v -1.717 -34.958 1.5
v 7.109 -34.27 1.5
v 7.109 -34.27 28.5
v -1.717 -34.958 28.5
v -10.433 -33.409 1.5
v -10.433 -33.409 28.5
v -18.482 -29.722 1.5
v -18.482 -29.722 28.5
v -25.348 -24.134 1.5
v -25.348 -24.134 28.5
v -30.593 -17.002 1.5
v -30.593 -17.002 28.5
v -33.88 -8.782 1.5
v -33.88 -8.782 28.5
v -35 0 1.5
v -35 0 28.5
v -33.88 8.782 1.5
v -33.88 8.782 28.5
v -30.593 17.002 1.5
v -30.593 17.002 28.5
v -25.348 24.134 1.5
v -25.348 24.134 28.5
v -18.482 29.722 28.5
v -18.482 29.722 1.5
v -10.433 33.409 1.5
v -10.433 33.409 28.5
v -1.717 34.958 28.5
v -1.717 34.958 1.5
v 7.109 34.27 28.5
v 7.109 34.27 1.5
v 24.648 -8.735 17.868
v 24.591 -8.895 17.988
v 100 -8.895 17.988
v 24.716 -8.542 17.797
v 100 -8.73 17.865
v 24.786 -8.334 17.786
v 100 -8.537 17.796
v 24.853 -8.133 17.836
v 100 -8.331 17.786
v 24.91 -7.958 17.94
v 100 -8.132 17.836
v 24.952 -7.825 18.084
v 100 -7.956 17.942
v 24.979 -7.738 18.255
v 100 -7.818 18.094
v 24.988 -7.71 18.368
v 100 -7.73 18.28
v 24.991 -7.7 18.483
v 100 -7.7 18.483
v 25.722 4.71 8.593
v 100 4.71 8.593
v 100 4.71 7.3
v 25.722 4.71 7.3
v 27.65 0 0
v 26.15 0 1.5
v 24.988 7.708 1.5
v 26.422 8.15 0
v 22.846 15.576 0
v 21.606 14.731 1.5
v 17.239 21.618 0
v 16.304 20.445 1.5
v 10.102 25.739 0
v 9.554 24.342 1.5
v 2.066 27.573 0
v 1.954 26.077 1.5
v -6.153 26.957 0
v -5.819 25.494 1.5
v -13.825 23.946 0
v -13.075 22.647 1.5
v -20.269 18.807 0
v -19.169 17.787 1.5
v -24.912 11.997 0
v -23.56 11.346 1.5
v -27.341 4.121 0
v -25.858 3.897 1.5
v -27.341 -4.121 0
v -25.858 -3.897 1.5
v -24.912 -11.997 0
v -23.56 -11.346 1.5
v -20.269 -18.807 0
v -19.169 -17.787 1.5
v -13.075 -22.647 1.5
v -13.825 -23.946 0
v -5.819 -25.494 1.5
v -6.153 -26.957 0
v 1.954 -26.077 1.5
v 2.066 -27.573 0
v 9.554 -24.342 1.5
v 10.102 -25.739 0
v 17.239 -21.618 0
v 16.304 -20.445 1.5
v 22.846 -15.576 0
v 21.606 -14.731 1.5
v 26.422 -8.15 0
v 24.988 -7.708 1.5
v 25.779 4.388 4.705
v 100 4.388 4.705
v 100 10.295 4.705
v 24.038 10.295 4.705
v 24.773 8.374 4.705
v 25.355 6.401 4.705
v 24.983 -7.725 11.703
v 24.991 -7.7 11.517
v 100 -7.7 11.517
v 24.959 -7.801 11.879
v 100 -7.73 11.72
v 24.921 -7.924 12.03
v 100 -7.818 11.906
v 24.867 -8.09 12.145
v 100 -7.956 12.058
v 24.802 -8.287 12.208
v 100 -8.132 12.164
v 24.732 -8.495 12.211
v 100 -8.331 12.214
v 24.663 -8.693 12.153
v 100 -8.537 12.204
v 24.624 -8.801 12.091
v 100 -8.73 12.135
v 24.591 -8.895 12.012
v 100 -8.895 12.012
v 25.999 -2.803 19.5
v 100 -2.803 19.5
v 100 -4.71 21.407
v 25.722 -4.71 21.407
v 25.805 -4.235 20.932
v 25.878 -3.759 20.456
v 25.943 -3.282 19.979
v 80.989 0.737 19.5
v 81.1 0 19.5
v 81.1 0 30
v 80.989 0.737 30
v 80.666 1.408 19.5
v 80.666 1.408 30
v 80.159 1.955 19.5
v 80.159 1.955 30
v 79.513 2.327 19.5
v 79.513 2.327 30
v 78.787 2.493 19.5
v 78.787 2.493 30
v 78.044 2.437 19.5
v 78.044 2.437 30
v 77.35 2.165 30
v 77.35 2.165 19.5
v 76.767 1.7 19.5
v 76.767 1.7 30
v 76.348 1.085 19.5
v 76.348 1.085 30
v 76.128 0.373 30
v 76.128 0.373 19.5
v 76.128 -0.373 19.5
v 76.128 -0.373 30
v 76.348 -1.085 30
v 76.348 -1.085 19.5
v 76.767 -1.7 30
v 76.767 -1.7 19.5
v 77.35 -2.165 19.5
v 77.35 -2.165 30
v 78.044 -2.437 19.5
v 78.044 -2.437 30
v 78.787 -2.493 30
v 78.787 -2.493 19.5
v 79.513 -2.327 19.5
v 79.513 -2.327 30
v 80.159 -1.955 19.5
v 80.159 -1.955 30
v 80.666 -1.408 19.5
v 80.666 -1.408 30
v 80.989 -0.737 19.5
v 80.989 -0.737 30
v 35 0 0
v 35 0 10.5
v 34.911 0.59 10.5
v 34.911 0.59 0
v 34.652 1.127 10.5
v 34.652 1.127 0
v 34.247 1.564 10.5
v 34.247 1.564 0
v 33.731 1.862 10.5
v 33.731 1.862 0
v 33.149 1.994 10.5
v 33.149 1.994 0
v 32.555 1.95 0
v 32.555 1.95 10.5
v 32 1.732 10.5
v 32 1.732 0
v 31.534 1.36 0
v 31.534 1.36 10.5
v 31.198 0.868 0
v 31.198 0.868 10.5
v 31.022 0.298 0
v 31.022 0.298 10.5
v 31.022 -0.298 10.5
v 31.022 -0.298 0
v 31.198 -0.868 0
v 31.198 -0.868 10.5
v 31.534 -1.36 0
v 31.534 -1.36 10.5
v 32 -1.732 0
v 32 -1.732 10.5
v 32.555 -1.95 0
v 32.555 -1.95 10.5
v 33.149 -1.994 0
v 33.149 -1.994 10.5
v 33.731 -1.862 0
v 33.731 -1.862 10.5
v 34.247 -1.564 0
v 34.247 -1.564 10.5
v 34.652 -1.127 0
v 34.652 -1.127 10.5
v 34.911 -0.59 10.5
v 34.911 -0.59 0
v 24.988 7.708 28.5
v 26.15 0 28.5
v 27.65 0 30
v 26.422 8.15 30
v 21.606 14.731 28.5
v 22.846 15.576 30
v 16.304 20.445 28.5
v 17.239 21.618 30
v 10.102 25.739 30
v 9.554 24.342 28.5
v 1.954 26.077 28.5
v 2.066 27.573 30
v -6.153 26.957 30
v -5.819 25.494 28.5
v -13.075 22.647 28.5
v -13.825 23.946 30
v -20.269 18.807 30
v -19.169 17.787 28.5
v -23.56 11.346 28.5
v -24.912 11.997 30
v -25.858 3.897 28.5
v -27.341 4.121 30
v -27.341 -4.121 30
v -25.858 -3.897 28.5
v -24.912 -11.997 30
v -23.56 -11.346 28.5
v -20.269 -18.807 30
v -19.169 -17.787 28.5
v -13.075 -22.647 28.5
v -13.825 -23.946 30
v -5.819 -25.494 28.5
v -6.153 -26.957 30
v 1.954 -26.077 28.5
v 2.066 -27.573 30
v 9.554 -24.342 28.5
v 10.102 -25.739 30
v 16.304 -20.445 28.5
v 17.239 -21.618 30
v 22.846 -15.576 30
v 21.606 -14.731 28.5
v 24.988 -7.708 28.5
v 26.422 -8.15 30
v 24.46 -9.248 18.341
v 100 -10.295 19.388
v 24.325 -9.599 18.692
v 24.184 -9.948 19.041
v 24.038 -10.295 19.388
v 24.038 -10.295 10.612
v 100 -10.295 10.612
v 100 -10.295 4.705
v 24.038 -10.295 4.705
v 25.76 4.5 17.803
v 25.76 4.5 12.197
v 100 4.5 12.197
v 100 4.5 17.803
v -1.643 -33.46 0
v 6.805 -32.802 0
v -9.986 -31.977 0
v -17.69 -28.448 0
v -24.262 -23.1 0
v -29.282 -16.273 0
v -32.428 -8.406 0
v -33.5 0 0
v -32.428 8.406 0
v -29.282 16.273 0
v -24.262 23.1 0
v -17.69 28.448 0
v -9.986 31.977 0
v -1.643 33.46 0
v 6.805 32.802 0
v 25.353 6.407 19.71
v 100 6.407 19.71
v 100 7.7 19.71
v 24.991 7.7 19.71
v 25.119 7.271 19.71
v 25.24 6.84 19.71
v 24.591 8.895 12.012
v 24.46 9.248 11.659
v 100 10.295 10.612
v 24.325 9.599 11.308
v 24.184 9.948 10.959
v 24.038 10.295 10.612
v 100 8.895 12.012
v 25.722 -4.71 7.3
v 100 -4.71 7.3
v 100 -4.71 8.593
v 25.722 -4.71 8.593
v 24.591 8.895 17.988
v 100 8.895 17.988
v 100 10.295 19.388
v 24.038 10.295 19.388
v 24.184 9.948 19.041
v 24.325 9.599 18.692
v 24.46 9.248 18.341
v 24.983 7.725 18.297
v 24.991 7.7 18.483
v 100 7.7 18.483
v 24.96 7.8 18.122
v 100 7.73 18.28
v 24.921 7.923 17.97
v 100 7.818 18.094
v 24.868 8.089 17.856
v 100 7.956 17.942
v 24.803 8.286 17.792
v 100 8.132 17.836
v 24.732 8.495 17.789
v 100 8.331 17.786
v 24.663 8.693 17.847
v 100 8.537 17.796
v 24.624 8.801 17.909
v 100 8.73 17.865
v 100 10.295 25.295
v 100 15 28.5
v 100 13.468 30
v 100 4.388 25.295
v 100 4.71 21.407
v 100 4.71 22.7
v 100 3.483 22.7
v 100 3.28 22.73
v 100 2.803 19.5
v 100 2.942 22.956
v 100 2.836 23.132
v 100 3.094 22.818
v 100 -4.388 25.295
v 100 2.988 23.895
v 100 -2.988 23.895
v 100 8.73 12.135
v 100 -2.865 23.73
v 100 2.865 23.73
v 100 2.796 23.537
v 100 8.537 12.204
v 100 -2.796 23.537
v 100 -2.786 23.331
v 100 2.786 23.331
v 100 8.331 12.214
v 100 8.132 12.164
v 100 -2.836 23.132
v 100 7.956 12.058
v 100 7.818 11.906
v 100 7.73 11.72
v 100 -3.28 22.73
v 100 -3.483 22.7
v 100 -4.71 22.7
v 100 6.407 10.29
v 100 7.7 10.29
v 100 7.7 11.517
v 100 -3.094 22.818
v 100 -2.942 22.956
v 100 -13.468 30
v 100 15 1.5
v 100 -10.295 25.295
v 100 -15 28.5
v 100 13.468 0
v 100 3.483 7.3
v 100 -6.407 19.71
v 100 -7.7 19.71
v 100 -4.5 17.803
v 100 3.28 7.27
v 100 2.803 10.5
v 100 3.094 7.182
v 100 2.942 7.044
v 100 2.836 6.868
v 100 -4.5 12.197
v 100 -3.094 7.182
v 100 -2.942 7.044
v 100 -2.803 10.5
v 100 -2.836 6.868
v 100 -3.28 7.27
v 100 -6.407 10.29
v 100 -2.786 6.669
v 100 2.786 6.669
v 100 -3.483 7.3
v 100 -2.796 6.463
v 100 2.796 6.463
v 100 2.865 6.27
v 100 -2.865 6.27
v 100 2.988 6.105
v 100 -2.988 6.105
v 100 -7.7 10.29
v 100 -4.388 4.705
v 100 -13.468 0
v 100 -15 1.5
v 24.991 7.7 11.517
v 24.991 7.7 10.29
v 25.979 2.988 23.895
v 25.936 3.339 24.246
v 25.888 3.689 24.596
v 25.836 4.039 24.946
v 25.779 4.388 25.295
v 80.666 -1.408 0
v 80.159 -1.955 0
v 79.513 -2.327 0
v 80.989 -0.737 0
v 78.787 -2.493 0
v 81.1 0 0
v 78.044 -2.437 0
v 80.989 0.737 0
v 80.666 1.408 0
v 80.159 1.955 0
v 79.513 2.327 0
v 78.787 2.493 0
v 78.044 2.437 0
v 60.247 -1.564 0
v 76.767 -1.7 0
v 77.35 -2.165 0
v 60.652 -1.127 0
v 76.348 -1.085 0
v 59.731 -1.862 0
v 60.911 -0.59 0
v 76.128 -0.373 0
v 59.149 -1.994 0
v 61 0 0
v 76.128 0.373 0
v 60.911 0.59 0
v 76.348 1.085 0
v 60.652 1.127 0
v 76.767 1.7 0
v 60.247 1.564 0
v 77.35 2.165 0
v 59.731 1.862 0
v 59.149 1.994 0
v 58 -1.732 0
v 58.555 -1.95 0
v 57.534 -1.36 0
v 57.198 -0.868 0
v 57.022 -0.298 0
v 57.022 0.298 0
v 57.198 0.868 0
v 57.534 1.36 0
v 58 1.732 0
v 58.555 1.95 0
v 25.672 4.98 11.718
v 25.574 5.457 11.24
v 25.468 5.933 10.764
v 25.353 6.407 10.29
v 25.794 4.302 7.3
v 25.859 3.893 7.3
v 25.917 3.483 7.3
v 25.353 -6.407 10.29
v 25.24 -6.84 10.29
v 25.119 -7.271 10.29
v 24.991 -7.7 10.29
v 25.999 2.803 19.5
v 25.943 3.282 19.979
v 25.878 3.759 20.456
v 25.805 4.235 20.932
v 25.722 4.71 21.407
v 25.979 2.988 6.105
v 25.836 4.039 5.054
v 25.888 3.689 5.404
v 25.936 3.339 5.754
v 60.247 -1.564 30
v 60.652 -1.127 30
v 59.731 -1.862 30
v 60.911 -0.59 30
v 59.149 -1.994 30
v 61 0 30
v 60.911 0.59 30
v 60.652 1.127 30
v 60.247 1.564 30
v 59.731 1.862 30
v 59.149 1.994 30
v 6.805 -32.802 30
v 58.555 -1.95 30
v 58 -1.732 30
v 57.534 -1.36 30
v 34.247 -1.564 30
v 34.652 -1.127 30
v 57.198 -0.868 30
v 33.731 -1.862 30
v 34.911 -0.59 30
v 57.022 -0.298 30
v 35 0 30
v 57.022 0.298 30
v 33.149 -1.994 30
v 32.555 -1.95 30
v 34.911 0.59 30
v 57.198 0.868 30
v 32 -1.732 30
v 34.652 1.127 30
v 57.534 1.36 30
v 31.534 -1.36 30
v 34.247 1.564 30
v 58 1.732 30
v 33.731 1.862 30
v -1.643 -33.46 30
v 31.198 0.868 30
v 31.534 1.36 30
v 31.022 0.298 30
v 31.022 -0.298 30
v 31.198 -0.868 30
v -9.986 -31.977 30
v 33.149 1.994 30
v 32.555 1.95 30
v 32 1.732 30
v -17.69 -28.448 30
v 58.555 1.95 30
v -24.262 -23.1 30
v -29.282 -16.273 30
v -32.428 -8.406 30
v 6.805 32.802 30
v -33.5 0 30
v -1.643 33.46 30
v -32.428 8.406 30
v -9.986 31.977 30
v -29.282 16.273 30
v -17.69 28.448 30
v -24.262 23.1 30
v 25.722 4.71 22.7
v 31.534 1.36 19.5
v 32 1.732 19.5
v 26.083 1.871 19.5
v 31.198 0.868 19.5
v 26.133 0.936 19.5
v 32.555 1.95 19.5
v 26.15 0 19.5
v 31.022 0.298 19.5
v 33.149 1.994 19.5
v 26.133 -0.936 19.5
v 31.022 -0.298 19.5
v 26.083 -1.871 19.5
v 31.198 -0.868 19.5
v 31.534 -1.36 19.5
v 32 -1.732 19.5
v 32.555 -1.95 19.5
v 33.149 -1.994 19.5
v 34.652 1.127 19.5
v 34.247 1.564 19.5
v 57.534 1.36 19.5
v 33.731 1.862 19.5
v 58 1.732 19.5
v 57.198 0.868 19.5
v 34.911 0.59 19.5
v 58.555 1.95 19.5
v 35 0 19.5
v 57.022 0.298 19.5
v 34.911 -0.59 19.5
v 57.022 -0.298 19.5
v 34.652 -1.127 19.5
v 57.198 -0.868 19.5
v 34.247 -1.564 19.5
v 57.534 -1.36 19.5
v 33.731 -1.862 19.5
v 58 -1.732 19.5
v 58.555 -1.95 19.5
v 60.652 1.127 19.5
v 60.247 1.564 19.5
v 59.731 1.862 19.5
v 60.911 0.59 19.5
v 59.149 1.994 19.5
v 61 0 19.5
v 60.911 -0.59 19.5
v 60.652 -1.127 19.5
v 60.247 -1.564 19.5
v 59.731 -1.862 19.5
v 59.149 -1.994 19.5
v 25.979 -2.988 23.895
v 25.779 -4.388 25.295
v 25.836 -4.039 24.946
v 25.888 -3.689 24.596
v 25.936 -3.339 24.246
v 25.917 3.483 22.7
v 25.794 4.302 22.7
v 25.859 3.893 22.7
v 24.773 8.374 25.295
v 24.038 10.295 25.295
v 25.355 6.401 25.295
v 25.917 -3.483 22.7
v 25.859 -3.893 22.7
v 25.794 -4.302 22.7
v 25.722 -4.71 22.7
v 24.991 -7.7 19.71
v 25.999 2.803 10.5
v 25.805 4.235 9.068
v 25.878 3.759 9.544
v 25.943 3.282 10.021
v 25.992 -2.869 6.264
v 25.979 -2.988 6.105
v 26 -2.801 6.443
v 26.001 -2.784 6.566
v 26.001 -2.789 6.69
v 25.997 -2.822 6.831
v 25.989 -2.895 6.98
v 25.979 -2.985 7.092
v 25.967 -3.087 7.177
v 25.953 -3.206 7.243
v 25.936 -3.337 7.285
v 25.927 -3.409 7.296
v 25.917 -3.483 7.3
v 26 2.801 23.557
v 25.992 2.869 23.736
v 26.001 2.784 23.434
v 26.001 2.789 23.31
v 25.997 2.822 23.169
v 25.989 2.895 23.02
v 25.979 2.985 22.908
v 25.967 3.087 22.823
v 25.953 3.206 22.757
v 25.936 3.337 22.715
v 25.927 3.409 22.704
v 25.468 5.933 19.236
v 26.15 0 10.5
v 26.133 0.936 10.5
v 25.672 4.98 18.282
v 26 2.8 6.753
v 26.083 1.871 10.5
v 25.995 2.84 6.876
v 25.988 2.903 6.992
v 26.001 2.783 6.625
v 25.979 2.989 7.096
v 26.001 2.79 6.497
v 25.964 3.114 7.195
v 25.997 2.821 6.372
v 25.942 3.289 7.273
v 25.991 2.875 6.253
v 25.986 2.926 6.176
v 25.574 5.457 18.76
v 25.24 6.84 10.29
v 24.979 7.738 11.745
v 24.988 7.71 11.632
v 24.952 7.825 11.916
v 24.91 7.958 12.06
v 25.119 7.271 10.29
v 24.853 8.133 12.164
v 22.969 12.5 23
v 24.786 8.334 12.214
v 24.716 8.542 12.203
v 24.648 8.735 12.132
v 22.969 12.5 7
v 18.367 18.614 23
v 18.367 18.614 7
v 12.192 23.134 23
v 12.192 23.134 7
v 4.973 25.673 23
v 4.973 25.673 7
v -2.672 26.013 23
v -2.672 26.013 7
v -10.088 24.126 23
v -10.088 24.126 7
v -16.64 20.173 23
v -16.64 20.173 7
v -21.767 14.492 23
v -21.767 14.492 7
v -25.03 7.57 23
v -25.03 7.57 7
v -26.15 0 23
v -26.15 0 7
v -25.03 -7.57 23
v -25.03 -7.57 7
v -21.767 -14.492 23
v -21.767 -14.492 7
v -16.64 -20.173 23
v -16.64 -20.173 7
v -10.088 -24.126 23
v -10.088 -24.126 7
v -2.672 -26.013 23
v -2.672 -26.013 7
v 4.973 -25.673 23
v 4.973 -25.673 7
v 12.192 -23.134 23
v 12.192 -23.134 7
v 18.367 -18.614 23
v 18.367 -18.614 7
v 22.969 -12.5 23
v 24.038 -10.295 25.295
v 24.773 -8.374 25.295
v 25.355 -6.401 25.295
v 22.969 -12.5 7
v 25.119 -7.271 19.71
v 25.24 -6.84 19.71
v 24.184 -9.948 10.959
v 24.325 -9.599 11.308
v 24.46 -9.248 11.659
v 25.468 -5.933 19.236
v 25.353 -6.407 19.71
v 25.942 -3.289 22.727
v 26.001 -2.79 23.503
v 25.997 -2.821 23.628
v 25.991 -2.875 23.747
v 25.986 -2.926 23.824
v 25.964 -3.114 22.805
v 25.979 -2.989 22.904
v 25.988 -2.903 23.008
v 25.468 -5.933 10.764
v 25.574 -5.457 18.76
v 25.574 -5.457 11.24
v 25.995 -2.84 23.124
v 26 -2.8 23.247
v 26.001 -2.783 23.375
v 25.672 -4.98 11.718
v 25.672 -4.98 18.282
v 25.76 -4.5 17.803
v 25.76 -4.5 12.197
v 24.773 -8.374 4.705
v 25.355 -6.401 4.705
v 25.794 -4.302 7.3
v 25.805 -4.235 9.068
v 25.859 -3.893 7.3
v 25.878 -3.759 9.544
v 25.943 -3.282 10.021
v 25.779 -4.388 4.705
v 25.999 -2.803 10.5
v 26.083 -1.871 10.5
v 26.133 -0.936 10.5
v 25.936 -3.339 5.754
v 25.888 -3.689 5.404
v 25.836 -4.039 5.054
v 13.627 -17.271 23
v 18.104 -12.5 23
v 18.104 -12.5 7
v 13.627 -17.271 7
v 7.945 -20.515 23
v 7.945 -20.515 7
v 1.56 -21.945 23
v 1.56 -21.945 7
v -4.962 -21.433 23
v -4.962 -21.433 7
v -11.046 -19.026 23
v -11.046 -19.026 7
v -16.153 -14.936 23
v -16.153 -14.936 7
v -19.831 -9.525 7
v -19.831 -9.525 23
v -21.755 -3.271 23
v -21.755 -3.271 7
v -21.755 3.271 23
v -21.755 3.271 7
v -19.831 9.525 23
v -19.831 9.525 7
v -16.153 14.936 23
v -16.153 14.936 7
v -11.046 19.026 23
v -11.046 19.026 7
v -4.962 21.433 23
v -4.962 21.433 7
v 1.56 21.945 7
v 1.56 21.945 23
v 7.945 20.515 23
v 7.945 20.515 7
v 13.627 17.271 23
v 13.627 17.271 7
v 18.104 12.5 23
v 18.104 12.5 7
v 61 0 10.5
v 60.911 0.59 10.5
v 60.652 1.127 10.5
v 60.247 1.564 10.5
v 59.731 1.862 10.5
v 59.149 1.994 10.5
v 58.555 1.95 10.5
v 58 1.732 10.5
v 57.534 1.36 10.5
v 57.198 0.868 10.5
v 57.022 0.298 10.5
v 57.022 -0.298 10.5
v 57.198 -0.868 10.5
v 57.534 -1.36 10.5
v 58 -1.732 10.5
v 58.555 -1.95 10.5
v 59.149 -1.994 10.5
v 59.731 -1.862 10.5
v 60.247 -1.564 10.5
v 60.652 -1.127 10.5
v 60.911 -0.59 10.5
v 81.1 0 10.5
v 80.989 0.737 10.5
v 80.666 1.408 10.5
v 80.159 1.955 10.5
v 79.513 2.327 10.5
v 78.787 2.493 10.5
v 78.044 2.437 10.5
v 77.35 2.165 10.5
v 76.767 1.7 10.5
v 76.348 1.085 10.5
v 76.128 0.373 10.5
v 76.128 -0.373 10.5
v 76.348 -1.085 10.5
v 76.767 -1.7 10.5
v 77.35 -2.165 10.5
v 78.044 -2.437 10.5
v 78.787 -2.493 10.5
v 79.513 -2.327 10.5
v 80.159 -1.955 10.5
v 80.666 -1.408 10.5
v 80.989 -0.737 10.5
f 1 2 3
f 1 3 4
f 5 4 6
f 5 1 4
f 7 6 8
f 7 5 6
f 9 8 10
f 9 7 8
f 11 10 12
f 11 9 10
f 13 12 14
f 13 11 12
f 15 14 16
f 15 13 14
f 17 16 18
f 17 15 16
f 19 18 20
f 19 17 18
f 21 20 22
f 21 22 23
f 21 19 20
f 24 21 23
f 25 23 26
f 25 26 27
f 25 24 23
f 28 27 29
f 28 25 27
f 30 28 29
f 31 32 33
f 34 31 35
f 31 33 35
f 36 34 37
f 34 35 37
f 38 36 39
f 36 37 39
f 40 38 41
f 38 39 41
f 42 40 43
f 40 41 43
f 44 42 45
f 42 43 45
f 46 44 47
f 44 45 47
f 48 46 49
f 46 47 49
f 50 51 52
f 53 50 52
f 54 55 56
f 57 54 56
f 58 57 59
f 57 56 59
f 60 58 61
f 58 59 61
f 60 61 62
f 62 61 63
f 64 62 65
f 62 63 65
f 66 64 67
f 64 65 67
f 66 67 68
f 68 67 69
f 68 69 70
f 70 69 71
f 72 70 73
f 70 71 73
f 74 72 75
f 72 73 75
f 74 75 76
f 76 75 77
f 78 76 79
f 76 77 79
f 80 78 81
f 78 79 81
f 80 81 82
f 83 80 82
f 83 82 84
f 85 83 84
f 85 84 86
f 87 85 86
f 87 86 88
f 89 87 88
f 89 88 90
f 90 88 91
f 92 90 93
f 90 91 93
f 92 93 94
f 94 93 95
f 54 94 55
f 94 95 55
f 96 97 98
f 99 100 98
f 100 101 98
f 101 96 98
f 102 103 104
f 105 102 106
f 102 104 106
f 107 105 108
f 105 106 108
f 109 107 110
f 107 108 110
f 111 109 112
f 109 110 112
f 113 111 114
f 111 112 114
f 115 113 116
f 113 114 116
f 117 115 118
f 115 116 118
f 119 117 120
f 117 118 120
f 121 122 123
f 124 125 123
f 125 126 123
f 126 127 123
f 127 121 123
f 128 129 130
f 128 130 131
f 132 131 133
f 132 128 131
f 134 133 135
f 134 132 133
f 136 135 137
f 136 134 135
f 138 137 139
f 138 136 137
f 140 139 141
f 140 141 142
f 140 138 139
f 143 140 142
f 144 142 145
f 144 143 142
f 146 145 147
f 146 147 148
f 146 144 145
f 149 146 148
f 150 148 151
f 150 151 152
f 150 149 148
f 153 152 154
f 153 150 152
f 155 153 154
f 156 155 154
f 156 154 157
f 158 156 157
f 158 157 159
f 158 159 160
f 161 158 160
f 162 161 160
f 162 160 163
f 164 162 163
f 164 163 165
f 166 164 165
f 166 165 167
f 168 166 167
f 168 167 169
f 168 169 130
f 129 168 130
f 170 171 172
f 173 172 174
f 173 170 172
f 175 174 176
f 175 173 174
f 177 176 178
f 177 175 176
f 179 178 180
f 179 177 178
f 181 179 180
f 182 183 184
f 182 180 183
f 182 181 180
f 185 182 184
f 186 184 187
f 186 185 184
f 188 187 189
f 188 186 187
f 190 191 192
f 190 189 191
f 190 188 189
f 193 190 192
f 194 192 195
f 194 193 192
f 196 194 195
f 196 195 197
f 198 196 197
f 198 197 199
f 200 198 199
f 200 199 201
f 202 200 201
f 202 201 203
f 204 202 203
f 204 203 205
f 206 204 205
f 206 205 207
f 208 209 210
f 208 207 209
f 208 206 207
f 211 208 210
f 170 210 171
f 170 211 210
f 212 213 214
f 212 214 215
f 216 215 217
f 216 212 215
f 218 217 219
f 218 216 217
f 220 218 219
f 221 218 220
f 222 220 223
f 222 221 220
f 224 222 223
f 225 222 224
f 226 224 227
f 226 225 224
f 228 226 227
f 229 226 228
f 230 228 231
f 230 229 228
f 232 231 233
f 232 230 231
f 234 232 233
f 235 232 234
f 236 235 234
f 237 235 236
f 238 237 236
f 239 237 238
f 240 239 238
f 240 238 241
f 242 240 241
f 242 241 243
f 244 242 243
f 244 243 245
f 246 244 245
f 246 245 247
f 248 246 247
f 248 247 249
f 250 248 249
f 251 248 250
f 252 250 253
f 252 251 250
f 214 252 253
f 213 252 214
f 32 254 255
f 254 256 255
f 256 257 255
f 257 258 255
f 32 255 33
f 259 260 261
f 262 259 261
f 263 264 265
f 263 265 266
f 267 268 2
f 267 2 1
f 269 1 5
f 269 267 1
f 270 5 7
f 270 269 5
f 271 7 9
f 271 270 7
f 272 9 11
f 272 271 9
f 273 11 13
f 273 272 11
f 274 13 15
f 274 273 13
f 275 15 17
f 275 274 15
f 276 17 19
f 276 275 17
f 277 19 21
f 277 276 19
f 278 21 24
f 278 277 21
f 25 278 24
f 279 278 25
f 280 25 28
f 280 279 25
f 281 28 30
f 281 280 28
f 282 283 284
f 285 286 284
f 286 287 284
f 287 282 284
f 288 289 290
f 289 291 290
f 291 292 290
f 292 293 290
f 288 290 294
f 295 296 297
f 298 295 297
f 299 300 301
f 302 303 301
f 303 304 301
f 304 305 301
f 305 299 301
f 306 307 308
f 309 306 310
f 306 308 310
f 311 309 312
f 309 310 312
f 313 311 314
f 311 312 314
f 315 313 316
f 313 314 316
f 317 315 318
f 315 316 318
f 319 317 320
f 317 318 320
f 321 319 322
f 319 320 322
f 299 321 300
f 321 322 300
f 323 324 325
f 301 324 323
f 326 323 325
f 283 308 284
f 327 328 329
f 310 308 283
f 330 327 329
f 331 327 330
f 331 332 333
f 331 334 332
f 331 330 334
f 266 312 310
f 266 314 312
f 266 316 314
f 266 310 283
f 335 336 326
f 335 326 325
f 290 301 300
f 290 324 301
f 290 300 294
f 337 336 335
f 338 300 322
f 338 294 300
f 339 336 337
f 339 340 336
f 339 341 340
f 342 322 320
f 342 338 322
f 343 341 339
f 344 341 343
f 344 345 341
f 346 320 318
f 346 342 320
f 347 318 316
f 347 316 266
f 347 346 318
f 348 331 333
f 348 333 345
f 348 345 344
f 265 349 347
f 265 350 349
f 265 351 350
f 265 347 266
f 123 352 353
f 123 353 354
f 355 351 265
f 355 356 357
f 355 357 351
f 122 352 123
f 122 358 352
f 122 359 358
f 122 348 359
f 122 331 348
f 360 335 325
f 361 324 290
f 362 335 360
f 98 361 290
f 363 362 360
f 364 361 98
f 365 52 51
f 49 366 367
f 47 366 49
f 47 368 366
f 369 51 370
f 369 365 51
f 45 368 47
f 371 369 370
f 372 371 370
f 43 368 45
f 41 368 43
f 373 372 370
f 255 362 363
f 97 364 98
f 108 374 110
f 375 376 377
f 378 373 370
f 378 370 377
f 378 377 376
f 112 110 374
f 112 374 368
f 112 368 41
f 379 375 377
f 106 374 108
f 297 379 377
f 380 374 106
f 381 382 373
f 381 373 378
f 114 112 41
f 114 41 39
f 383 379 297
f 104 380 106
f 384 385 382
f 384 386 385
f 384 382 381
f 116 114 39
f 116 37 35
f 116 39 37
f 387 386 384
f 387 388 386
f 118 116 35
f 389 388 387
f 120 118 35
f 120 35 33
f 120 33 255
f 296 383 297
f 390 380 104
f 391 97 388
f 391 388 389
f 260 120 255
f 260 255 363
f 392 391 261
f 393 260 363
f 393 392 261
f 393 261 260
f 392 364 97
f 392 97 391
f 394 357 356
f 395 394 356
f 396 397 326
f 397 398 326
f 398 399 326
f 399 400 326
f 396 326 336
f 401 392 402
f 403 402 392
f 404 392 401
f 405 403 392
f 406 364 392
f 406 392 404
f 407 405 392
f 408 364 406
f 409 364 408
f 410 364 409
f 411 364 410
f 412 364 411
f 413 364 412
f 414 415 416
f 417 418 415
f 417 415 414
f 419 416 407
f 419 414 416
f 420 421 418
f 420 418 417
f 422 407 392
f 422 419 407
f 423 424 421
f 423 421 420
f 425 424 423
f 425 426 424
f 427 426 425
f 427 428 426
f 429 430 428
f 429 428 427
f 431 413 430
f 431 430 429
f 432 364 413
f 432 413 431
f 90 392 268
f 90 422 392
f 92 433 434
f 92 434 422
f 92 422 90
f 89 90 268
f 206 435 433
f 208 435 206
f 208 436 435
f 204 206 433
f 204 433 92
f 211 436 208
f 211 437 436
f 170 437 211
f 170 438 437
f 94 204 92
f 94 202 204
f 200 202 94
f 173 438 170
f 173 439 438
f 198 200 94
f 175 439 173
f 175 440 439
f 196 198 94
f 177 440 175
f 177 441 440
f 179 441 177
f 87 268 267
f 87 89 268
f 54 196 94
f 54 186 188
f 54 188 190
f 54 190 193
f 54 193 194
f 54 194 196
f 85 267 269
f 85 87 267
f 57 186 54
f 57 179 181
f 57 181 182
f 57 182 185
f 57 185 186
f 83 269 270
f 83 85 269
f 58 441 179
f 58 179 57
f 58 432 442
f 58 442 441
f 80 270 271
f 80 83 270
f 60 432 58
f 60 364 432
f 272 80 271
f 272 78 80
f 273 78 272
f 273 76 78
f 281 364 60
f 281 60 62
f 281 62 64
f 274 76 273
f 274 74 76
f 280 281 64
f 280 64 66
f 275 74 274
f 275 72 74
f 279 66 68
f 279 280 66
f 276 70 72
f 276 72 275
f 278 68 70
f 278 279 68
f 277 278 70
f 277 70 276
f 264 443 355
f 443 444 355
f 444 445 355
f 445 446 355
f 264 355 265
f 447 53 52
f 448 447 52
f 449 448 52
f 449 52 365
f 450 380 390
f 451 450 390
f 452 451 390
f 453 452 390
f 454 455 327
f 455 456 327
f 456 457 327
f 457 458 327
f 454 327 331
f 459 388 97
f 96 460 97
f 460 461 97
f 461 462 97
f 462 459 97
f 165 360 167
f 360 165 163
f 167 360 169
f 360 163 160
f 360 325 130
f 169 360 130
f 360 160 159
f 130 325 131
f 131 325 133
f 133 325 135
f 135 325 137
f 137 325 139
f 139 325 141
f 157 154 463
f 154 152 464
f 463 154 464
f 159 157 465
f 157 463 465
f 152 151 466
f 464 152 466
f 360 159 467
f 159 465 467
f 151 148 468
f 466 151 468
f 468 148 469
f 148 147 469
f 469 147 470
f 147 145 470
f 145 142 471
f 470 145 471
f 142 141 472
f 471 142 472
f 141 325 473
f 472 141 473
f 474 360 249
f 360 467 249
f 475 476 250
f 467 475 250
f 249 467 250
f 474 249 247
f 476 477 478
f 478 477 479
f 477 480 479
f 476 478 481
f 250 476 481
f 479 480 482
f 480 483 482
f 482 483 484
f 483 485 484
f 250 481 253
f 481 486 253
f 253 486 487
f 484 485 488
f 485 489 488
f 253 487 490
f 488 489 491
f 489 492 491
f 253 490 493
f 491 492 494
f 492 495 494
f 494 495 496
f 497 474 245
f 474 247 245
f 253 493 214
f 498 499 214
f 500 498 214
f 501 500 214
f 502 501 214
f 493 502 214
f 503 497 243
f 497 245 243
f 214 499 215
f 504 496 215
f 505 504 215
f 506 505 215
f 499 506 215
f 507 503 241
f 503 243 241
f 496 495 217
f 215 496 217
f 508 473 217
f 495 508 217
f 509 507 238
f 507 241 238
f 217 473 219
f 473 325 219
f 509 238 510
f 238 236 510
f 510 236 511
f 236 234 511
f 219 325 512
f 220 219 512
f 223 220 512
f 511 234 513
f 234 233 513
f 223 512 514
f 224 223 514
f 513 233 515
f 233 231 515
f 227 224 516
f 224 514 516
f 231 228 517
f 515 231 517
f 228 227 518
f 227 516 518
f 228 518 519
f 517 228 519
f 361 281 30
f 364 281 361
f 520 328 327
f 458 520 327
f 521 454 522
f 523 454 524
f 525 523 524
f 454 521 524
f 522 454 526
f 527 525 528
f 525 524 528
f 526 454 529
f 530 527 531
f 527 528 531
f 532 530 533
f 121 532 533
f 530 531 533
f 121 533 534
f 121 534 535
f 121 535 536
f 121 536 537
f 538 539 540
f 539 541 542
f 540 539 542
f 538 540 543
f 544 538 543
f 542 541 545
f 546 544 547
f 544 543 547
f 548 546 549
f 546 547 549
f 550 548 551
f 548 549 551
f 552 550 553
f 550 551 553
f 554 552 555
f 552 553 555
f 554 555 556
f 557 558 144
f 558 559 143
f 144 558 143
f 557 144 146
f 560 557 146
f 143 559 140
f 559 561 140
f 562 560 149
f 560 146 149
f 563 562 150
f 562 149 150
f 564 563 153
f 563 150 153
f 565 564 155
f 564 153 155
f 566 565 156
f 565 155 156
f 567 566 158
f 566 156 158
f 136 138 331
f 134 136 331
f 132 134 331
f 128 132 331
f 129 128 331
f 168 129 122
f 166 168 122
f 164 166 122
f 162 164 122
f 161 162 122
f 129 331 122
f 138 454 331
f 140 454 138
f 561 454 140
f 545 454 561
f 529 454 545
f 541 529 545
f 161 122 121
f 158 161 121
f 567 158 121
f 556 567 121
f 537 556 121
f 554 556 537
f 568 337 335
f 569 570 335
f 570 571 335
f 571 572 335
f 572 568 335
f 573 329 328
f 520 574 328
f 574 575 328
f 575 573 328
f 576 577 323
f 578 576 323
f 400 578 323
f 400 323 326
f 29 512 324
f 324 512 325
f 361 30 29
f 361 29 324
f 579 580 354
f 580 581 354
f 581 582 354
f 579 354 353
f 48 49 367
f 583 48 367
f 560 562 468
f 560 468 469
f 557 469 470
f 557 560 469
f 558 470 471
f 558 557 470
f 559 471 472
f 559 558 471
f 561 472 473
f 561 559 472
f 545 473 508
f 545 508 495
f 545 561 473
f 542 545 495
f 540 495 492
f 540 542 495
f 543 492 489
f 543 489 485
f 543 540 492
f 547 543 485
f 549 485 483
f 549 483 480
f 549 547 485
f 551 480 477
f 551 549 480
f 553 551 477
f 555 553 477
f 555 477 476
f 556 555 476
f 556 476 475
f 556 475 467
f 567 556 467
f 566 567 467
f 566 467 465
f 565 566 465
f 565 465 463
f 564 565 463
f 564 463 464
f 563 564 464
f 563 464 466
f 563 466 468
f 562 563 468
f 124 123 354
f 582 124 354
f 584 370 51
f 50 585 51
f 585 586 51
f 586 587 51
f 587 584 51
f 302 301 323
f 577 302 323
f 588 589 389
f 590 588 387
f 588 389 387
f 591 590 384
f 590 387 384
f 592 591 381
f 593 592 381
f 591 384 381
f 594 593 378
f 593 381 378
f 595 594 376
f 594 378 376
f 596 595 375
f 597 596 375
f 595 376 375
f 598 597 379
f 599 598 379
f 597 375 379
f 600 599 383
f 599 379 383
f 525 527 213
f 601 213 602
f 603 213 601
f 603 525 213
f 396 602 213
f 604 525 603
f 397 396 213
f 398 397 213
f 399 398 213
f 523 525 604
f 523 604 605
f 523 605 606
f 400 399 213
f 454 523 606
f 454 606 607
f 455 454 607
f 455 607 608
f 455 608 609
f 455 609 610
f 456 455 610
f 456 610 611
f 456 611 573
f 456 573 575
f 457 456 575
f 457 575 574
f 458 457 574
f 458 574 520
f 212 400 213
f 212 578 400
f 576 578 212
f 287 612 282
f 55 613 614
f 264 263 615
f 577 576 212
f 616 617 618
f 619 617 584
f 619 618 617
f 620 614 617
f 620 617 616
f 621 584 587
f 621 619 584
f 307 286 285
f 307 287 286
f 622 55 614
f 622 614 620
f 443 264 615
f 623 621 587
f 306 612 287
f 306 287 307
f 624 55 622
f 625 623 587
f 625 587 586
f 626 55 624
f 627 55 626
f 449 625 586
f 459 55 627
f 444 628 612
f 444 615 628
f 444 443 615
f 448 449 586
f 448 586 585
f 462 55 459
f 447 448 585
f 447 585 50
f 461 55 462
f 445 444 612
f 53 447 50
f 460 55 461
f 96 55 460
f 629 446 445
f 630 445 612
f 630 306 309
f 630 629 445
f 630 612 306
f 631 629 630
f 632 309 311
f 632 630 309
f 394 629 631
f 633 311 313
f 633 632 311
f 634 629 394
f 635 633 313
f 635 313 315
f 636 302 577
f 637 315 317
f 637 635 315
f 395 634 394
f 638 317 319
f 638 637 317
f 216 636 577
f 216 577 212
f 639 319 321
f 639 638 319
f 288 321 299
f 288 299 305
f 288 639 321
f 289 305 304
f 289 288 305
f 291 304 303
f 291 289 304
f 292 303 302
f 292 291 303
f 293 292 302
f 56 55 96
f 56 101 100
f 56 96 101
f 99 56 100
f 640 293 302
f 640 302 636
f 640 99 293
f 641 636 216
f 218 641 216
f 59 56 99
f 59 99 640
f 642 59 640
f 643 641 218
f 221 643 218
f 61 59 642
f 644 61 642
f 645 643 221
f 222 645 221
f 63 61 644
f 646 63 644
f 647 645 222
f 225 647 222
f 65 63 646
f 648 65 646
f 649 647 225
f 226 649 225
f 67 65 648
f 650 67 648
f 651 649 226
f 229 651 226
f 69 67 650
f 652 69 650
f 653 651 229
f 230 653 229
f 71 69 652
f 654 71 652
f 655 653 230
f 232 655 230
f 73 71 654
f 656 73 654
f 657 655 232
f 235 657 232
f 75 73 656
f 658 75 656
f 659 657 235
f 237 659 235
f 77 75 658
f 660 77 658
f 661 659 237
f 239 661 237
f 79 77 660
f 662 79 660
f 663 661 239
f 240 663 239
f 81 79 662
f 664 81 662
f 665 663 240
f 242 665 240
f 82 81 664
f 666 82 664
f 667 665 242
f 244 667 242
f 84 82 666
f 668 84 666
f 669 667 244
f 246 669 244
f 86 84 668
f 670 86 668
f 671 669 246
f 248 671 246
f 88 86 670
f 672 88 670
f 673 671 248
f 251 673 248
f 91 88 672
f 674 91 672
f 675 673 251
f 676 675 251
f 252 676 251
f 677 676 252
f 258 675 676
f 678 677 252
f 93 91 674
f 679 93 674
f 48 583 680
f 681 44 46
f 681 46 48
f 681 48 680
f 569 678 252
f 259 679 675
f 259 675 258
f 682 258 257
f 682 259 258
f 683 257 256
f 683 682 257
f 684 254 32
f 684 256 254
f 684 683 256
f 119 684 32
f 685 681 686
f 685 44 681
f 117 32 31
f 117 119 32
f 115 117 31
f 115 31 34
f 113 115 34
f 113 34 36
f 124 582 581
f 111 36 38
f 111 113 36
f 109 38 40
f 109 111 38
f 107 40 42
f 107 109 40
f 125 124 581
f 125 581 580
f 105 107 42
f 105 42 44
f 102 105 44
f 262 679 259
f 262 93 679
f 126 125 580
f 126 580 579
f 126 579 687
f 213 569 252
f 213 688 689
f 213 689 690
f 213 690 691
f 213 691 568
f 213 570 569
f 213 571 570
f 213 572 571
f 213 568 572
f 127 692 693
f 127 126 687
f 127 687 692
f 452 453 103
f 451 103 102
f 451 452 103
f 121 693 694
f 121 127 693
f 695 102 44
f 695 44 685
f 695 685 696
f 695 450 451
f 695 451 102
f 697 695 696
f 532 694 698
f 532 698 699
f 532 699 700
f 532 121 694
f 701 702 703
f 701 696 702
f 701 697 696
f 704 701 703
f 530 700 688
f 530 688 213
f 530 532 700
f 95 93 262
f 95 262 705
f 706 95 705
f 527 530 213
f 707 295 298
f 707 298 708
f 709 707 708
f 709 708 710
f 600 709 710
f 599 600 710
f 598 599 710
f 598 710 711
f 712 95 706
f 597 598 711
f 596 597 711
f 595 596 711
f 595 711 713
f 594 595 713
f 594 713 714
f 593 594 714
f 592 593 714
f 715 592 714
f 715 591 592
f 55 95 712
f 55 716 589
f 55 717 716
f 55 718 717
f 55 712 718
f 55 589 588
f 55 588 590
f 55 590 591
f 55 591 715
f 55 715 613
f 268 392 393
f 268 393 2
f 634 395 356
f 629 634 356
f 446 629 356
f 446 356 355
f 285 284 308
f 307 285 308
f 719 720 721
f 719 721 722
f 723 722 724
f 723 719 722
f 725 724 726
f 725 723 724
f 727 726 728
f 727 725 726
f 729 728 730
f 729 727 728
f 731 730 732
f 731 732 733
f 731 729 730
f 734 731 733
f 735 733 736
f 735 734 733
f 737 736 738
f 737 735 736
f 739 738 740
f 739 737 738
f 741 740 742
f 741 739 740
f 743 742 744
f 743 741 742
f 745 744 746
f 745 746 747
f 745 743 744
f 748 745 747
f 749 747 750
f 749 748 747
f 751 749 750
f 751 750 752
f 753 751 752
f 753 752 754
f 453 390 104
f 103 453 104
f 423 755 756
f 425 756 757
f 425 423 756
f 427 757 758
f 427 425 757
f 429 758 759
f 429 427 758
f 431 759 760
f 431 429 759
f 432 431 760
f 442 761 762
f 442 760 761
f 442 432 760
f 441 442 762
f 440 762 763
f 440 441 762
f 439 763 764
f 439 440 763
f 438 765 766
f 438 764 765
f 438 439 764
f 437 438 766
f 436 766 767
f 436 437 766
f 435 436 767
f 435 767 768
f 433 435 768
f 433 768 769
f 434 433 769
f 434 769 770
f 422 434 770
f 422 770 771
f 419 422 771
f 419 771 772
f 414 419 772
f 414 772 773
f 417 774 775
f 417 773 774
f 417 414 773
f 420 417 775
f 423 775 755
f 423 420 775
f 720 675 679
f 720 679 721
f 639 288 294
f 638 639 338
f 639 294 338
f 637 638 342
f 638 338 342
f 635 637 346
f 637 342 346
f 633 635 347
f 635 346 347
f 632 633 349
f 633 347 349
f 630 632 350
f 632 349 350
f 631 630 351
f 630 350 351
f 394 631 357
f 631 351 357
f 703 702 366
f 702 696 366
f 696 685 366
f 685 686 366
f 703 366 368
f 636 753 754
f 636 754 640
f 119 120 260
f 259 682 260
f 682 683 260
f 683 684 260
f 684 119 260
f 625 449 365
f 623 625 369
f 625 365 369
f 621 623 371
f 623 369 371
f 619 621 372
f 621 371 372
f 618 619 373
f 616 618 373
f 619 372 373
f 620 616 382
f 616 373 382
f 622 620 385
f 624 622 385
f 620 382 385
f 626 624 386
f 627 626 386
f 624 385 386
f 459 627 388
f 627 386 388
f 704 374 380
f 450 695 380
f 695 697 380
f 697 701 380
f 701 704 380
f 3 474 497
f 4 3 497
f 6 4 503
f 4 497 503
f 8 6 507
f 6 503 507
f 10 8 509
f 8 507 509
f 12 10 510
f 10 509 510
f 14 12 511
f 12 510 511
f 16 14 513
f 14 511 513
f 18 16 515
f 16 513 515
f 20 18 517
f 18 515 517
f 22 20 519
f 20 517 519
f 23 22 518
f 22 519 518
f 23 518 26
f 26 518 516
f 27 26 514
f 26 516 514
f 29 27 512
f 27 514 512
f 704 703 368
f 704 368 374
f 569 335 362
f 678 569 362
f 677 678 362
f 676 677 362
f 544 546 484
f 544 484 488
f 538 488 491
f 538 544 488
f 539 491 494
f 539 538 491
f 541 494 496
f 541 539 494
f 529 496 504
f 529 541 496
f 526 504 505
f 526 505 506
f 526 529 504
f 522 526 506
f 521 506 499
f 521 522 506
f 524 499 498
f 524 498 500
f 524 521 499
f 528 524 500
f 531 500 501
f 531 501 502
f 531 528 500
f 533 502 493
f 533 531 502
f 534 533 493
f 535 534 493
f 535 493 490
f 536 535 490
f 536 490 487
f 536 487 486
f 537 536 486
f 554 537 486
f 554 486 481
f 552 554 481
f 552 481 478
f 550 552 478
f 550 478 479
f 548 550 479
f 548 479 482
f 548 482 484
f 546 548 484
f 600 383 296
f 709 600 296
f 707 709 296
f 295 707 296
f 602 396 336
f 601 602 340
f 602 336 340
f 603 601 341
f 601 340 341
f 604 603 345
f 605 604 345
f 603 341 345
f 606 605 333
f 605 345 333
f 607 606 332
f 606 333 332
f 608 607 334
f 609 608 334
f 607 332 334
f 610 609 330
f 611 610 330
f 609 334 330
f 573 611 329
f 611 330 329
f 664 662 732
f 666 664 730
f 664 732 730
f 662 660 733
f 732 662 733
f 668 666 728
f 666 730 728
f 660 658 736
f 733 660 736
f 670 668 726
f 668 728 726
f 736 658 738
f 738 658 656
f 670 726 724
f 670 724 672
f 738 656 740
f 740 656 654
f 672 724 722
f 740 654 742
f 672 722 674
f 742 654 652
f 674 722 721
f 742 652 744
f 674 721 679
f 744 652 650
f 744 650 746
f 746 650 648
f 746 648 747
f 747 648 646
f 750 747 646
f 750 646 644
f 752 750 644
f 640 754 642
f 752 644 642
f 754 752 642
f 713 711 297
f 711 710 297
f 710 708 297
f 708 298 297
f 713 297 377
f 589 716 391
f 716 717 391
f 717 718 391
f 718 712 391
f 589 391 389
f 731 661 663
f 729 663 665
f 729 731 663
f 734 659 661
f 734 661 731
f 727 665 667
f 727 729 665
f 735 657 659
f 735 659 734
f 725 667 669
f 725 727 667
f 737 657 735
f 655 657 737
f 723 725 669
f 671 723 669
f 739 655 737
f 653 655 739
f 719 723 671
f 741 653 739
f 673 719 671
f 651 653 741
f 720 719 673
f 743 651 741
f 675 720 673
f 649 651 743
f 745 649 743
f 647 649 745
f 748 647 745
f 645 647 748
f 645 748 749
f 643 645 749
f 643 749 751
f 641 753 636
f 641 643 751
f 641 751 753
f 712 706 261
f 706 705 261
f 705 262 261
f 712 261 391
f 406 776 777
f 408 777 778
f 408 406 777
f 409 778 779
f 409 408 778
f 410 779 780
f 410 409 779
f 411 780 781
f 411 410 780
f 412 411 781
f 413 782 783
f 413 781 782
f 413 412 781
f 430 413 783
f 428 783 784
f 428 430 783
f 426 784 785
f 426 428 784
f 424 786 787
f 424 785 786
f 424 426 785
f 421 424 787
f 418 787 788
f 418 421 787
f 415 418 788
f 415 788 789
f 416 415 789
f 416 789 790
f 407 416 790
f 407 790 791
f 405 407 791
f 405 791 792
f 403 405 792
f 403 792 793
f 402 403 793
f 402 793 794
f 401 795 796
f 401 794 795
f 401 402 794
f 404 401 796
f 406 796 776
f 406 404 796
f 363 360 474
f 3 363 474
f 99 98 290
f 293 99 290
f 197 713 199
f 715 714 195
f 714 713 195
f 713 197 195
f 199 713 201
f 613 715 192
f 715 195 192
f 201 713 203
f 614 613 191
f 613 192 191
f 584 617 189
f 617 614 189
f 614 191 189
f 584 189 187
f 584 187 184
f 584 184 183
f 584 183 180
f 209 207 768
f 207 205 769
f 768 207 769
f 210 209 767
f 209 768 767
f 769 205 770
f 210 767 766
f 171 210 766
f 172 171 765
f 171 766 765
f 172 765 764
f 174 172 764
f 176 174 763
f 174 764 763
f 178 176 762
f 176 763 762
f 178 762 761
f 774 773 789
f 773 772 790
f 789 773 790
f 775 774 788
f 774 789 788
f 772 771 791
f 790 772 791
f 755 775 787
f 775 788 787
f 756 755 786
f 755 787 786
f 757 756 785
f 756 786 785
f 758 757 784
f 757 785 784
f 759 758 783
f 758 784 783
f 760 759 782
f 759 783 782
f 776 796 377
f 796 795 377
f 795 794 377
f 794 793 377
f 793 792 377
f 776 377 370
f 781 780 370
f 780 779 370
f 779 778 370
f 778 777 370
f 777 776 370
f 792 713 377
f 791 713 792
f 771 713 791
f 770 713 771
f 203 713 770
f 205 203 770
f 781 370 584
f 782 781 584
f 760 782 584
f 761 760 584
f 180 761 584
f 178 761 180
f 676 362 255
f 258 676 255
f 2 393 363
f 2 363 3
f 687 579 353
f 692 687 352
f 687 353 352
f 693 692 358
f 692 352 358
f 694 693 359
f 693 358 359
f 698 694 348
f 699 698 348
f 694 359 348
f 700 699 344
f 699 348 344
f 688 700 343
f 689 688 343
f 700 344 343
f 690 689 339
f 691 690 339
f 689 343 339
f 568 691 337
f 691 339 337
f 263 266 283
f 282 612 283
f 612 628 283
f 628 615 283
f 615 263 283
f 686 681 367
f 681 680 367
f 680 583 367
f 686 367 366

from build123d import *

# Parameters (mm, degrees)
SKETCH1_R           = 26.15
SKETCH1_R_2         = 2
SKETCH1_R_3         = 2.5
BOSS_EXTRUDE1_DEPTH = 30
BOSS_EXTRUDE2_START = -7
BOSS_EXTRUDE2_DEPTH = 16
CHAMFER1_SIZE       = 1.5
CUT_EXTRUDE1_DEPTH  = 90


with BuildPart() as part:
    # Sketch1 → Boss-Extrude1 (new body)
    with BuildSketch(Plane.XY):
        with BuildLine():
            Line((100, 15), (100, -15))
            Line((100, -15), (7.109450059, -34.270332941))
            ThreePointArc((7.109450059, -34.270332941), (-35, 0), (7.109450059, 34.270332941))
            Line((7.109450059, 34.270332941), (100, 15))
        make_face()
        Circle(SKETCH1_R, mode=Mode.SUBTRACT)
        with Locations((59, 0)):
            Circle(SKETCH1_R_2, mode=Mode.SUBTRACT)
        with Locations((78.6, 0)):
            Circle(SKETCH1_R_3, mode=Mode.SUBTRACT)
        with Locations((33, 0)):
            Circle(SKETCH1_R_2, mode=Mode.SUBTRACT)
    extrude(amount=BOSS_EXTRUDE1_DEPTH)

    # Sketch2 → Boss-Extrude2 (add)
    with BuildSketch(Plane.XY.offset(30).offset(BOSS_EXTRUDE2_START)):
        with BuildLine():
            Line((18.10386699, 12.5), (22.968946428, 12.5))
            ThreePointArc((22.968946428, 12.5), (-26.15, 0), (22.968946428, -12.5))
            Line((22.968946428, -12.5), (18.10386699, -12.5))
            ThreePointArc((18.10386699, -12.5), (-22, 0), (18.10386699, 12.5))
        make_face()
    extrude(amount=-BOSS_EXTRUDE2_DEPTH)

    # Chamfer1
    chamfer1_edges = [part.edges().sort_by_distance(p)[0] for p in [
        (-26.15, 0, 0),
        (-26.15, 0, 30),
        (53.554725029, -24.63516647, 30),
        (53.554725029, 24.63516647, 30),
        (53.554725029, -24.63516647, 0),
        (-35, 0, 0),
        (53.554725029, 24.63516647, 0),
        (-35, 0, 30),
    ]]
    chamfer(chamfer1_edges, length=CHAMFER1_SIZE)

    # Sketch3 → Cut-Extrude1 (cut)
    with BuildSketch(Plane(origin=(100, 0, 0), x_dir=(0, 0, -1), z_dir=(1, 0, 0))):
        with BuildLine():
            Line((-12.197056275, 4.5), (-17.802943725, 4.5))
            Line((-17.802943725, 4.5), (-19.710050506, 6.407106781))
            Line((-19.710050506, 6.407106781), (-19.710050506, 7.7))
            Line((-19.710050506, 7.7), (-18.482842712, 7.7))
            ThreePointArc((-18.482842712, 7.7), (-17.83612704, 8.132121597), (-17.987867966, 8.894974747))
            Line((-17.987867966, 8.894974747), (-19.387867966, 10.294974747))
            Line((-19.387867966, 10.294974747), (-25.294974747, 10.294974747))
            Line((-25.294974747, 10.294974747), (-25.294974747, 4.387867966))
            Line((-25.294974747, 4.387867966), (-23.894974747, 2.987867966))
            ThreePointArc((-23.894974747, 2.987867966), (-23.132121597, 2.83612704), (-22.7, 3.482842712))
            Line((-22.7, 3.482842712), (-22.7, 4.710050506))
            Line((-22.7, 4.710050506), (-21.407106781, 4.710050506))
            Line((-21.407106781, 4.710050506), (-19.5, 2.802943725))
            Line((-19.5, 2.802943725), (-19.5, -2.802943725))
            Line((-19.5, -2.802943725), (-21.407106781, -4.710050506))
            Line((-21.407106781, -4.710050506), (-22.7, -4.710050506))
            Line((-22.7, -4.710050506), (-22.7, -3.482842712))
            ThreePointArc((-22.7, -3.482842712), (-23.132121597, -2.83612704), (-23.894974747, -2.987867966))
            Line((-23.894974747, -2.987867966), (-25.294974747, -4.387867966))
            Line((-25.294974747, -4.387867966), (-25.294974747, -10.294974747))
            Line((-25.294974747, -10.294974747), (-19.387867966, -10.294974747))
            Line((-19.387867966, -10.294974747), (-17.987867966, -8.894974747))
            ThreePointArc((-17.987867966, -8.894974747), (-17.83612704, -8.132121597), (-18.482842712, -7.7))
            Line((-18.482842712, -7.7), (-19.710050506, -7.7))
            Line((-19.710050506, -7.7), (-19.710050506, -6.407106781))
            Line((-19.710050506, -6.407106781), (-17.802943725, -4.5))
            Line((-17.802943725, -4.5), (-12.197056275, -4.5))
            Line((-12.197056275, -4.5), (-10.289949494, -6.407106781))
            Line((-10.289949494, -6.407106781), (-10.289949494, -7.7))
            Line((-10.289949494, -7.7), (-11.517157288, -7.7))
            ThreePointArc((-11.517157288, -7.7), (-12.16387296, -8.132121597), (-12.012132034, -8.894974747))
            Line((-12.012132034, -8.894974747), (-10.612132034, -10.294974747))
            Line((-10.612132034, -10.294974747), (-4.705025253, -10.294974747))
            Line((-4.705025253, -10.294974747), (-4.705025253, -4.387867966))
            Line((-4.705025253, -4.387867966), (-6.105025253, -2.987867966))
            ThreePointArc((-6.105025253, -2.987867966), (-6.867878403, -2.83612704), (-7.3, -3.482842712))
            Line((-7.3, -3.482842712), (-7.3, -4.710050506))
            Line((-7.3, -4.710050506), (-8.592893219, -4.710050506))
            Line((-8.592893219, -4.710050506), (-10.5, -2.802943725))
            Line((-10.5, -2.802943725), (-10.5, 2.802943725))
            Line((-10.5, 2.802943725), (-8.592893219, 4.710050506))
            Line((-8.592893219, 4.710050506), (-7.3, 4.710050506))
            Line((-7.3, 4.710050506), (-7.3, 3.482842712))
            ThreePointArc((-7.3, 3.482842712), (-6.867878403, 2.83612704), (-6.105025253, 2.987867966))
            Line((-6.105025253, 2.987867966), (-4.705025253, 4.387867966))
            Line((-4.705025253, 4.387867966), (-4.705025253, 10.294974747))
            Line((-4.705025253, 10.294974747), (-10.612132034, 10.294974747))
            Line((-10.612132034, 10.294974747), (-12.012132034, 8.894974747))
            ThreePointArc((-12.012132034, 8.894974747), (-12.16387296, 8.132121597), (-11.517157288, 7.7))
            Line((-11.517157288, 7.7), (-10.289949494, 7.7))
            Line((-10.289949494, 7.7), (-10.289949494, 6.407106781))
            Line((-10.289949494, 6.407106781), (-12.197056275, 4.5))
        make_face()
    extrude(amount=-CUT_EXTRUDE1_DEPTH, mode=Mode.SUBTRACT)


solid = part.part
